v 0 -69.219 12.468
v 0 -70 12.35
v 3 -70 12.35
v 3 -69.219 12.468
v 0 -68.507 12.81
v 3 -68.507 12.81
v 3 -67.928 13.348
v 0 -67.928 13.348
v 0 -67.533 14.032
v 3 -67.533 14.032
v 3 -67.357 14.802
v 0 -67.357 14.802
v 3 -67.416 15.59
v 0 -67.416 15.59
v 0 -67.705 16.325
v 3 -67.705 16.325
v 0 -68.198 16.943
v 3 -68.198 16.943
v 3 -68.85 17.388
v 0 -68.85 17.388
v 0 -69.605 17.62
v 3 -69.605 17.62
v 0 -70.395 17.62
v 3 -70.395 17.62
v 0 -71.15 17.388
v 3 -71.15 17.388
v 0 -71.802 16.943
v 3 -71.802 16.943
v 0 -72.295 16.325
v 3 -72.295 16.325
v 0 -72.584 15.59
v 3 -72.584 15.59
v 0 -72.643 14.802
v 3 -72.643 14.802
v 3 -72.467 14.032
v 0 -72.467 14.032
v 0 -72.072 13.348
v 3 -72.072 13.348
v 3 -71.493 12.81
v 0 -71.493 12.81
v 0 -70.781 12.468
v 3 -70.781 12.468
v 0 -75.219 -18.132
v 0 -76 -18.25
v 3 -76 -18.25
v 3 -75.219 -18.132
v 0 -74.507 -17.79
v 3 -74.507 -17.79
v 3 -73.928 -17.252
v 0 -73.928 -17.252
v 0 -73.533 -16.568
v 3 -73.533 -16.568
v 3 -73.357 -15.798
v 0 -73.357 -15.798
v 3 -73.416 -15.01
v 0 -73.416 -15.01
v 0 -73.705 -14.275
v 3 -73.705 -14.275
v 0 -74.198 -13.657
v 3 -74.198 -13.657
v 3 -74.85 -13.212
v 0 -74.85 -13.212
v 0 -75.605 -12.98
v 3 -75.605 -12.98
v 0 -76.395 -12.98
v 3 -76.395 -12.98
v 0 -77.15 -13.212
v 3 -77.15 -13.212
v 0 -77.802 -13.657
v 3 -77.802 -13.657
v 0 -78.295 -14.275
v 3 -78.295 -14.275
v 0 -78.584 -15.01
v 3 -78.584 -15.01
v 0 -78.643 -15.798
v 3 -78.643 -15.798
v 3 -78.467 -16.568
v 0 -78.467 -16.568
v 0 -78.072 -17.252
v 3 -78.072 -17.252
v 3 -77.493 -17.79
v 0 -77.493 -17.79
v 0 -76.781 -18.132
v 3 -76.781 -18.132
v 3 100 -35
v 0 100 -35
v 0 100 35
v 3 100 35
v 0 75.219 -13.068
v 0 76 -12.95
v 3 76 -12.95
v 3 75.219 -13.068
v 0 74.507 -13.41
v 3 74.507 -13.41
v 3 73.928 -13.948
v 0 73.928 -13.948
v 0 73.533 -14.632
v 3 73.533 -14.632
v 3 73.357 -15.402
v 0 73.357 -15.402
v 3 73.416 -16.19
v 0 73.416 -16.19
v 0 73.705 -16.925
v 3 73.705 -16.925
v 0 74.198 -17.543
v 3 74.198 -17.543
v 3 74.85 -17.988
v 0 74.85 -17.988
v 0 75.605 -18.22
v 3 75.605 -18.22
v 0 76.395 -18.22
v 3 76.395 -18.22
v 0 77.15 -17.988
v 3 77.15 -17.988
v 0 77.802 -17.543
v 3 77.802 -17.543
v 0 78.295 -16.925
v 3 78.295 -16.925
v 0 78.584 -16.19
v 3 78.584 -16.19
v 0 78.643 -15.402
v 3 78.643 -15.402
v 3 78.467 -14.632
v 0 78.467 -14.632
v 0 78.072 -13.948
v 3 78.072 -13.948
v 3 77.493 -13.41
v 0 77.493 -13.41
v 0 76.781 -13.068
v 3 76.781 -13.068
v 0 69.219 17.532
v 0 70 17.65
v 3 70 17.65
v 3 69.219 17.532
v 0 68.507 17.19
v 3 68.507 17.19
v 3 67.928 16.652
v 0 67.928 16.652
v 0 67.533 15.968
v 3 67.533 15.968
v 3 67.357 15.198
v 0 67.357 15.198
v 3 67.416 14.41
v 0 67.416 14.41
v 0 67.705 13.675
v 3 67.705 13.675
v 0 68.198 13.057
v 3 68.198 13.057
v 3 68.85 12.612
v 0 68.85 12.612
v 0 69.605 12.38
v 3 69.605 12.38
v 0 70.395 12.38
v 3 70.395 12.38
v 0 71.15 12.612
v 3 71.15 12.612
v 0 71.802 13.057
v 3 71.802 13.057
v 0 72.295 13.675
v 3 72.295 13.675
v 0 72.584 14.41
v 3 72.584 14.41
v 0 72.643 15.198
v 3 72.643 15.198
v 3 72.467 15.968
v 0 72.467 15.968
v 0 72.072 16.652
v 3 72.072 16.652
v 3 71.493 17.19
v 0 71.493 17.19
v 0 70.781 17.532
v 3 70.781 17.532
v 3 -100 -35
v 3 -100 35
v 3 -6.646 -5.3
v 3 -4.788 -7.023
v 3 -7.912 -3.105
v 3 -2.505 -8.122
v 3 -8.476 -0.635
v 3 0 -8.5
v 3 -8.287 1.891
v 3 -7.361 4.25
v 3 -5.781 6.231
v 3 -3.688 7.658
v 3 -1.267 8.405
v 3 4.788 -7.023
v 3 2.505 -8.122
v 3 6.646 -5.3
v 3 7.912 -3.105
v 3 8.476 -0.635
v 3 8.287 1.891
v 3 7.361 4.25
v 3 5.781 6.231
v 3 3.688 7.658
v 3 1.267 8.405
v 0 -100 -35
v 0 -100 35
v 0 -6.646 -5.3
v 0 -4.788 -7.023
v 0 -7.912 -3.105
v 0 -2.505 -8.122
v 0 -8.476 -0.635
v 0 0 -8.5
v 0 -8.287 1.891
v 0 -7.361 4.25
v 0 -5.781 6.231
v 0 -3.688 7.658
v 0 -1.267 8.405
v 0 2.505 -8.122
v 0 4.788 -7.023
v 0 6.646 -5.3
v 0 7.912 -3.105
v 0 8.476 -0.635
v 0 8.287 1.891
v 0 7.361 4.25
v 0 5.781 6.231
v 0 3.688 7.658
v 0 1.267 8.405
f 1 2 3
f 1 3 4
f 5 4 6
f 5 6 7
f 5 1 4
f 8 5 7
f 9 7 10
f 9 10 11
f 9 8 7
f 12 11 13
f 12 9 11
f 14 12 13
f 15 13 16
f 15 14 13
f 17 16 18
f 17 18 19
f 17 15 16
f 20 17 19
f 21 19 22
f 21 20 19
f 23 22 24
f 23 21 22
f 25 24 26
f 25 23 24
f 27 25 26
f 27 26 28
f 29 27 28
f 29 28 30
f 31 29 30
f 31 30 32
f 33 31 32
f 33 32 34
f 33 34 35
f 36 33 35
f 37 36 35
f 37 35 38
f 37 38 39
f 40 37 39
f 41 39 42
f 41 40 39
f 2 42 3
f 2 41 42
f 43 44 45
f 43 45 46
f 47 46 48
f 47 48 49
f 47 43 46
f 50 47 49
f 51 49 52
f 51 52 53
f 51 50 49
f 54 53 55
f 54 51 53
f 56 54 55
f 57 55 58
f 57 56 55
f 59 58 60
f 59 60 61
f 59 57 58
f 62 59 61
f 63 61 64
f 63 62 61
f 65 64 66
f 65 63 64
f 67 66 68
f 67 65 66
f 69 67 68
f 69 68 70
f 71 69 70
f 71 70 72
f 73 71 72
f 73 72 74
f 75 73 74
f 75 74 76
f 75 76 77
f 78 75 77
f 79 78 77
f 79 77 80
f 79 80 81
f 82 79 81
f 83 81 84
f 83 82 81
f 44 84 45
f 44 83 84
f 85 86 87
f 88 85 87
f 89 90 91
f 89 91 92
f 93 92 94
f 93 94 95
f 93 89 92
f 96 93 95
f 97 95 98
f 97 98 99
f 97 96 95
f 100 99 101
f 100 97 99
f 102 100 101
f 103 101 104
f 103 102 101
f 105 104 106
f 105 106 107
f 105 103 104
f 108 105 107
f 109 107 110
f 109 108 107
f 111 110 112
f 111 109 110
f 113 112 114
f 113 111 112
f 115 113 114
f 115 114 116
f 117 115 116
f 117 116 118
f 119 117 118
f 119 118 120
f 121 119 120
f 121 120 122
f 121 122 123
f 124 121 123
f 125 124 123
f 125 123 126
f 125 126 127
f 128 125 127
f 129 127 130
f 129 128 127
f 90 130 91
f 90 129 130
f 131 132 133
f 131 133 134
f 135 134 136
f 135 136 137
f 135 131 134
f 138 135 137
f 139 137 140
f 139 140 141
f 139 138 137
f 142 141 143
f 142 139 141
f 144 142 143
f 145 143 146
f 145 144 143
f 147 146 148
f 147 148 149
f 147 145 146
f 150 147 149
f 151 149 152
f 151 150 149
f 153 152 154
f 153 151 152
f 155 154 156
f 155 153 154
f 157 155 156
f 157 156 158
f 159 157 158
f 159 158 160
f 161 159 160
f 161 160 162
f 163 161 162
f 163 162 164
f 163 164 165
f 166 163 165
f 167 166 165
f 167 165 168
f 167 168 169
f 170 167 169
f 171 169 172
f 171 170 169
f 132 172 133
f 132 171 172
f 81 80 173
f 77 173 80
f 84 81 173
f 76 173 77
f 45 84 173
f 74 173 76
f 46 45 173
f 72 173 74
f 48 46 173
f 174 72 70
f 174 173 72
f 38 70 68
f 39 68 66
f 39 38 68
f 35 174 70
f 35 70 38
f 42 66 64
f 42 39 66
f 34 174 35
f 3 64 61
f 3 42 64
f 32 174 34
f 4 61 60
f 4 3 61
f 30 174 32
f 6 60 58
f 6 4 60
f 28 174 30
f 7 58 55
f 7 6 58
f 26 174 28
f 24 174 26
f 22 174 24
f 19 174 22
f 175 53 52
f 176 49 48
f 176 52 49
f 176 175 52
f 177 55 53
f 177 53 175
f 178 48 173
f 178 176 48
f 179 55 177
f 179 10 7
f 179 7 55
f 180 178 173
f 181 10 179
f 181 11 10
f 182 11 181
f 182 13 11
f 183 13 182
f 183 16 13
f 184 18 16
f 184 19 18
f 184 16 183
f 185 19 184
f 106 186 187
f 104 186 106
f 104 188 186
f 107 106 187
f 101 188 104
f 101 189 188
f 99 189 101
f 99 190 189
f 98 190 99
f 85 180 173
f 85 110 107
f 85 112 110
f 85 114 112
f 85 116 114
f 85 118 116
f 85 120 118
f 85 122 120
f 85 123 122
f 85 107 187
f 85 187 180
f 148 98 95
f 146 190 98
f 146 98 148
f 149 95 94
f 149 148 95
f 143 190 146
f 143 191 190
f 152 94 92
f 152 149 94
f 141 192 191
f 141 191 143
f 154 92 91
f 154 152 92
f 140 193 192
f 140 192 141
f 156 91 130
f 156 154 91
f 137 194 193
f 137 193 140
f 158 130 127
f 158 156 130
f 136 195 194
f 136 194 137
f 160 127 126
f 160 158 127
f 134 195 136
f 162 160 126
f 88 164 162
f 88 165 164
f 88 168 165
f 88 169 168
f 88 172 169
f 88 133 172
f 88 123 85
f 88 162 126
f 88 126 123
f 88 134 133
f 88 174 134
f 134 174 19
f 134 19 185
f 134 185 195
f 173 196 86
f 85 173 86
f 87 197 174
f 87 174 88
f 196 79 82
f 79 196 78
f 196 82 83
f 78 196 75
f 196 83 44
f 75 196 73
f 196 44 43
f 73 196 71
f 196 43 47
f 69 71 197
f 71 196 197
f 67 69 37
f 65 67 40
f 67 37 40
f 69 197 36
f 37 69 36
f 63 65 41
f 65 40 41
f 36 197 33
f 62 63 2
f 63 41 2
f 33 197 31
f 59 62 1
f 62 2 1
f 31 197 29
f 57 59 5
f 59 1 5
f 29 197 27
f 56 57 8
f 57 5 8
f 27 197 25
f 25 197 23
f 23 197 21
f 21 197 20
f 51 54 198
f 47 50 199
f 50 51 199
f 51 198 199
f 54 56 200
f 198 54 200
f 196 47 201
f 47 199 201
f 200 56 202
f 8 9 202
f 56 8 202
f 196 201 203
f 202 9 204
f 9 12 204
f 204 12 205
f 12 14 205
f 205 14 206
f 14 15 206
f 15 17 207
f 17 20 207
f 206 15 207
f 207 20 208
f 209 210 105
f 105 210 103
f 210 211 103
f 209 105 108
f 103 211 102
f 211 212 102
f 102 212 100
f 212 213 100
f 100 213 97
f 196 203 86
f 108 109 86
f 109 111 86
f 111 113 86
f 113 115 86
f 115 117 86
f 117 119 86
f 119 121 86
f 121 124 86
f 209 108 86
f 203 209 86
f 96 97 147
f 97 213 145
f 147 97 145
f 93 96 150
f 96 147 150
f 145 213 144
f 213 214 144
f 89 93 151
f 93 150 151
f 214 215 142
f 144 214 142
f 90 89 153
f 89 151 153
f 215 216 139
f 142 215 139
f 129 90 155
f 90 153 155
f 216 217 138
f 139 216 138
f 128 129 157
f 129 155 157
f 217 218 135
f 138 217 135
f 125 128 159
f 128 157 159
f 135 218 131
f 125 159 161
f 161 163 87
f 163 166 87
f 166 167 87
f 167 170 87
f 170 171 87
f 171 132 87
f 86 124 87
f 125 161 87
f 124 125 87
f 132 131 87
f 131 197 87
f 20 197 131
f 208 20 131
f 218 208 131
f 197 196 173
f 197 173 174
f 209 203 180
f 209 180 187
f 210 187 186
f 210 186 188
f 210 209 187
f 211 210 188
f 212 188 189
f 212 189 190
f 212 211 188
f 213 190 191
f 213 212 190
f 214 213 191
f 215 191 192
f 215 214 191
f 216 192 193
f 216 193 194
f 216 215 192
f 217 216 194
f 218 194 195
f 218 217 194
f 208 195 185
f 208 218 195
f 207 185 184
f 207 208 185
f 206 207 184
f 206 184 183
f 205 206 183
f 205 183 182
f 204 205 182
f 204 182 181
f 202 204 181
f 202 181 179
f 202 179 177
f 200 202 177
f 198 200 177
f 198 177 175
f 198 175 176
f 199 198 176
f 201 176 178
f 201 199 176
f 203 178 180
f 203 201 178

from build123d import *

# Parameters (mm, degrees)
SKETCH1_W           = 200
SKETCH1_H           = 70
SKETCH1_R           = 2.65
SKETCH1_R_2         = 8.5
BOSS_EXTRUDE1_DEPTH = 3


with BuildPart() as part:
    # Sketch1 → Boss-Extrude1 (new body)
    with BuildSketch(Plane.YZ):
        Rectangle(SKETCH1_W, SKETCH1_H)
        with Locations(Location((-76, -15.6, 0), (0, 0, 270))):
            Circle(SKETCH1_R, mode=Mode.SUBTRACT)
        with Locations(Location((76, -15.6, 0), (0, 0, 90))):
            Circle(SKETCH1_R, mode=Mode.SUBTRACT)
        with Locations(Location((-70, 15, 0), (0, 0, 270))):
            Circle(SKETCH1_R, mode=Mode.SUBTRACT)
        with Locations(Location((70, 15, 0), (0, 0, 90))):
            Circle(SKETCH1_R, mode=Mode.SUBTRACT)
        with Locations(Location((0, 0, 0), (0, 0, 270))):
            Circle(SKETCH1_R_2, mode=Mode.SUBTRACT)
    extrude(amount=BOSS_EXTRUDE1_DEPTH)


solid = part.part
